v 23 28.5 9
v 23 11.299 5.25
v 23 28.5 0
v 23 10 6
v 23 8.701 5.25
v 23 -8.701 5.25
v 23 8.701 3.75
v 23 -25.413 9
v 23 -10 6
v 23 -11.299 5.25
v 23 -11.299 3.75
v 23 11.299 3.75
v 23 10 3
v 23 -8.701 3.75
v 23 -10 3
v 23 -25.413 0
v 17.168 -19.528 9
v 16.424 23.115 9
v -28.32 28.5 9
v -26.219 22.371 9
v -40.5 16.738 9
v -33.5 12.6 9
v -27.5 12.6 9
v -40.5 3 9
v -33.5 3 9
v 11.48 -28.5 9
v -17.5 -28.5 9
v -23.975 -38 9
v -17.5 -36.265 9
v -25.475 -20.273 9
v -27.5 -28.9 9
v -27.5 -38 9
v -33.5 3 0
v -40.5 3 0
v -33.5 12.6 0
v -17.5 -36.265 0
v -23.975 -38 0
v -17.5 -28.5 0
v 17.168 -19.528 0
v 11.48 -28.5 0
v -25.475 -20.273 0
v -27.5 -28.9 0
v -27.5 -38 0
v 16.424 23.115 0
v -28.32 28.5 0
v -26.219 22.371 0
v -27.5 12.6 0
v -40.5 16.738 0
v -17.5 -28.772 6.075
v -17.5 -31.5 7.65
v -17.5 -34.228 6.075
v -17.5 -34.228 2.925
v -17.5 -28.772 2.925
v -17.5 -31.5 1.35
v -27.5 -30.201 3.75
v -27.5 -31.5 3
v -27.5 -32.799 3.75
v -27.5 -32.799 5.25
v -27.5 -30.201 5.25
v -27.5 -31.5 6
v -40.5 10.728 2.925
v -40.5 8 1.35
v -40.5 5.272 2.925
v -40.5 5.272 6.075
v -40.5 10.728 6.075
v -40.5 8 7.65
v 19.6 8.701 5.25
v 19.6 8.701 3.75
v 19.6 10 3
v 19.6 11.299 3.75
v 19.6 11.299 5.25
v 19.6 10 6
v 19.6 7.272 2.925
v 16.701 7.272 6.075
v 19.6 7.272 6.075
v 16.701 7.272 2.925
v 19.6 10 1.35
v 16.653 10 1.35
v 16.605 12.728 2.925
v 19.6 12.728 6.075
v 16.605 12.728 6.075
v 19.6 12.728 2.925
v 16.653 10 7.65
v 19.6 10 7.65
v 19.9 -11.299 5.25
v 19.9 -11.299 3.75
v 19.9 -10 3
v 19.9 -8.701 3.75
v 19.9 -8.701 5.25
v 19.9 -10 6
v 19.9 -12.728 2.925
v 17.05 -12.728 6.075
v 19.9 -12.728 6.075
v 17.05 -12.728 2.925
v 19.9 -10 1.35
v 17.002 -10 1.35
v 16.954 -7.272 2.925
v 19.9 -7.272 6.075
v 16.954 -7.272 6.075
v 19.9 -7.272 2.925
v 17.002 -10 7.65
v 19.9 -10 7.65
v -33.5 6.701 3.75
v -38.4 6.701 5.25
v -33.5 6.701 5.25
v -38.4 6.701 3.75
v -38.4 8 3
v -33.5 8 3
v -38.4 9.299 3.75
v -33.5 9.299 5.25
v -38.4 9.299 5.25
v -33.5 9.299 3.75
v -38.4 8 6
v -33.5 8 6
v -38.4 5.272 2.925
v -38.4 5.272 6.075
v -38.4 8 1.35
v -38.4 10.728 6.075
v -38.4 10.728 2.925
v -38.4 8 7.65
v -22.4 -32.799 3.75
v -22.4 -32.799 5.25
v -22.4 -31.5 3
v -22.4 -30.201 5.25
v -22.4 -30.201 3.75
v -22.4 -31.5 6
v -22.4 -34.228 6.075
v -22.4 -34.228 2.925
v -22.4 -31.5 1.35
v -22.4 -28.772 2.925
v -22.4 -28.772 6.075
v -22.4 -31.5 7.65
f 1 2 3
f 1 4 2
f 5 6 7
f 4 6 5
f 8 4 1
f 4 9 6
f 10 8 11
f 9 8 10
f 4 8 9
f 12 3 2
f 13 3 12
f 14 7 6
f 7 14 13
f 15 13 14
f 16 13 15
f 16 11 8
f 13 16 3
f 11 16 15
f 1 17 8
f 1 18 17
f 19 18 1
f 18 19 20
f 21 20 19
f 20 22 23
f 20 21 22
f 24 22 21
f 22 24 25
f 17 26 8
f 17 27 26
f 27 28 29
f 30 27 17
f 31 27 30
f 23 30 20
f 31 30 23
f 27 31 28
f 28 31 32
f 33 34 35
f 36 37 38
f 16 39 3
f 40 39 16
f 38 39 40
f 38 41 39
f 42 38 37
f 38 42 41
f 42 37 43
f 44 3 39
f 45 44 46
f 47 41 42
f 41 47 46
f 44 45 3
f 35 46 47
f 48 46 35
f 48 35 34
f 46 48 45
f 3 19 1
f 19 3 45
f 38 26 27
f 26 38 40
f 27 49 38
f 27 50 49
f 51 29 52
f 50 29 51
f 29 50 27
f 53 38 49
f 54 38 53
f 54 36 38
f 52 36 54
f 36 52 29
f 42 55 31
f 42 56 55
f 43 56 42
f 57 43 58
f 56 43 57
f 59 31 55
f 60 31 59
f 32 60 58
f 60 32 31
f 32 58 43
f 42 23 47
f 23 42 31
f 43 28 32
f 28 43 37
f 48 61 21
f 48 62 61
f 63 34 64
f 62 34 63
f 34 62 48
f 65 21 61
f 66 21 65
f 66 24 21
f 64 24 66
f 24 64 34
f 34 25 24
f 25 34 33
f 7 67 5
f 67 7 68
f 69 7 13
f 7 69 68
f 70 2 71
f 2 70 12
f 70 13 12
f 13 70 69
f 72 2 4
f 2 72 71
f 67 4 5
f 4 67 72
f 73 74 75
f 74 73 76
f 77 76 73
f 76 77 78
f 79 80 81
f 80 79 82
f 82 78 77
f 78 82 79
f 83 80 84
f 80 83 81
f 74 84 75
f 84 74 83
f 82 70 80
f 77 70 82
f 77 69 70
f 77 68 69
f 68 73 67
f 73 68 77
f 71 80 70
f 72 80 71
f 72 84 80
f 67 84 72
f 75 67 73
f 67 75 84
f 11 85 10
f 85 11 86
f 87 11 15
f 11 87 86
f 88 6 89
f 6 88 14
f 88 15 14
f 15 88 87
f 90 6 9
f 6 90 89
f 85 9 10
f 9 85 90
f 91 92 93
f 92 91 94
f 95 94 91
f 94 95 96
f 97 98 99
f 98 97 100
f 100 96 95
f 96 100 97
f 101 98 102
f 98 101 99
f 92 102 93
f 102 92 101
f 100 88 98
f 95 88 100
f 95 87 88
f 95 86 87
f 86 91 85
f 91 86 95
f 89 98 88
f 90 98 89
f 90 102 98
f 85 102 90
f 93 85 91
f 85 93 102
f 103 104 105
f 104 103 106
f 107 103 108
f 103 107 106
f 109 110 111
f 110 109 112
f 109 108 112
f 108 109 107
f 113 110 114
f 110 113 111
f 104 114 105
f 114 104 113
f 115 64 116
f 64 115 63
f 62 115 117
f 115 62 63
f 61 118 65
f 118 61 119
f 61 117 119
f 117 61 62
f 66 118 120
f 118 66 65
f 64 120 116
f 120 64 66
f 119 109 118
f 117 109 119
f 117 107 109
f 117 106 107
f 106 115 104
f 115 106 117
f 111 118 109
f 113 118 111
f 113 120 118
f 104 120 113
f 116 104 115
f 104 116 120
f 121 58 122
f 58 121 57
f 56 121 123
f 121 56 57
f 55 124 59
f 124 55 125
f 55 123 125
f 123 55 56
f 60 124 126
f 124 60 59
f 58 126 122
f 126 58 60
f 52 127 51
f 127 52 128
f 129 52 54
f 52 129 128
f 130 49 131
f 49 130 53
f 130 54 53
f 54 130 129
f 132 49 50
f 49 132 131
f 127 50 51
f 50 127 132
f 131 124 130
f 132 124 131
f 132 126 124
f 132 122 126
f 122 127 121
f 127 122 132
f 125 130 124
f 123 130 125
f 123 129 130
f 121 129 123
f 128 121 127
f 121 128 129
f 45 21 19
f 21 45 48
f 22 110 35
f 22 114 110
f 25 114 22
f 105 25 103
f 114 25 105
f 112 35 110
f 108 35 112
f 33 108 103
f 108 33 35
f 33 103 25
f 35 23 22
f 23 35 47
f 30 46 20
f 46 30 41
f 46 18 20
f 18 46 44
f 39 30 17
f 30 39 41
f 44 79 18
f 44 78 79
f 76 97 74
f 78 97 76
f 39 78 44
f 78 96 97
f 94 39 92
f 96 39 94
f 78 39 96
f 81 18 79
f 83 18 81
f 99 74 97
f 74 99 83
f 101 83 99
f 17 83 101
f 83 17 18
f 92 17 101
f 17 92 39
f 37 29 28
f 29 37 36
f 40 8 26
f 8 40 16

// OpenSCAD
module x_carriage_adapter(){
difference(){
		union(){
			translate([-4.5,0,4.5]) cube([55,57,9],center=true);
			translate([-22.5,-32,4.5]) rotate([0,0,0]) cube([10,12,9],center=true);
			translate([-40.5,3,0]) rotate([0,0,0]) cube([19,25,9]);
		}
			translate([-19,37.5,0]) rotate([0,0,134]) cube([17.5,39.5,9]);
			translate([-33.5,-28.9,0]) rotate([0,0,0]) cube([6,41.5,9]);
			//translate([-62.5,10,-0.1]) cube([35,50,16]);
			rotate([0,0,1]) translate([-4.5,1.5,8]) cube([42.65,42.65,16],center=true);
			rotate([0,0,15]) translate([-4.5,-35.5,8]) cube([70,10,16],center=true);
			rotate([0,90,0]) translate([-4.5,10,16.6]) 
					{
						cylinder(r=1.5,h=8,$fn=6);
						cylinder(r=3.15,h=3,$fn=6);
					}
			rotate([0,90,0]) translate([-4.5,-10,16.9]) 
					{
						cylinder(r=1.5,h=7,$fn=6);
						cylinder(r=3.15,h=3,$fn=6);
					}

			
			rotate([0,90,0]) translate([-4.5,8,0]) 
					{
						translate([0,0,-48]) cylinder(r=1.5,h=19,$fn=6);
						translate([0,0,-43.4]) cylinder(r=3.15,h=5,$fn=6);
						//translate([0,0,15]) cube([10,8,16],center=true);
						
					}
			rotate([0,90,0]) translate([-4.5,-31.5,0]) //parte sinistra
					{
						translate([0,0,-28]) cylinder(r=1.5,h=39,$fn=6); //foro basso
						translate([0,0,-22.4]) cylinder(r=3.15,h=5,$fn=6); 
					}



	}
}

x_carriage_adapter();
